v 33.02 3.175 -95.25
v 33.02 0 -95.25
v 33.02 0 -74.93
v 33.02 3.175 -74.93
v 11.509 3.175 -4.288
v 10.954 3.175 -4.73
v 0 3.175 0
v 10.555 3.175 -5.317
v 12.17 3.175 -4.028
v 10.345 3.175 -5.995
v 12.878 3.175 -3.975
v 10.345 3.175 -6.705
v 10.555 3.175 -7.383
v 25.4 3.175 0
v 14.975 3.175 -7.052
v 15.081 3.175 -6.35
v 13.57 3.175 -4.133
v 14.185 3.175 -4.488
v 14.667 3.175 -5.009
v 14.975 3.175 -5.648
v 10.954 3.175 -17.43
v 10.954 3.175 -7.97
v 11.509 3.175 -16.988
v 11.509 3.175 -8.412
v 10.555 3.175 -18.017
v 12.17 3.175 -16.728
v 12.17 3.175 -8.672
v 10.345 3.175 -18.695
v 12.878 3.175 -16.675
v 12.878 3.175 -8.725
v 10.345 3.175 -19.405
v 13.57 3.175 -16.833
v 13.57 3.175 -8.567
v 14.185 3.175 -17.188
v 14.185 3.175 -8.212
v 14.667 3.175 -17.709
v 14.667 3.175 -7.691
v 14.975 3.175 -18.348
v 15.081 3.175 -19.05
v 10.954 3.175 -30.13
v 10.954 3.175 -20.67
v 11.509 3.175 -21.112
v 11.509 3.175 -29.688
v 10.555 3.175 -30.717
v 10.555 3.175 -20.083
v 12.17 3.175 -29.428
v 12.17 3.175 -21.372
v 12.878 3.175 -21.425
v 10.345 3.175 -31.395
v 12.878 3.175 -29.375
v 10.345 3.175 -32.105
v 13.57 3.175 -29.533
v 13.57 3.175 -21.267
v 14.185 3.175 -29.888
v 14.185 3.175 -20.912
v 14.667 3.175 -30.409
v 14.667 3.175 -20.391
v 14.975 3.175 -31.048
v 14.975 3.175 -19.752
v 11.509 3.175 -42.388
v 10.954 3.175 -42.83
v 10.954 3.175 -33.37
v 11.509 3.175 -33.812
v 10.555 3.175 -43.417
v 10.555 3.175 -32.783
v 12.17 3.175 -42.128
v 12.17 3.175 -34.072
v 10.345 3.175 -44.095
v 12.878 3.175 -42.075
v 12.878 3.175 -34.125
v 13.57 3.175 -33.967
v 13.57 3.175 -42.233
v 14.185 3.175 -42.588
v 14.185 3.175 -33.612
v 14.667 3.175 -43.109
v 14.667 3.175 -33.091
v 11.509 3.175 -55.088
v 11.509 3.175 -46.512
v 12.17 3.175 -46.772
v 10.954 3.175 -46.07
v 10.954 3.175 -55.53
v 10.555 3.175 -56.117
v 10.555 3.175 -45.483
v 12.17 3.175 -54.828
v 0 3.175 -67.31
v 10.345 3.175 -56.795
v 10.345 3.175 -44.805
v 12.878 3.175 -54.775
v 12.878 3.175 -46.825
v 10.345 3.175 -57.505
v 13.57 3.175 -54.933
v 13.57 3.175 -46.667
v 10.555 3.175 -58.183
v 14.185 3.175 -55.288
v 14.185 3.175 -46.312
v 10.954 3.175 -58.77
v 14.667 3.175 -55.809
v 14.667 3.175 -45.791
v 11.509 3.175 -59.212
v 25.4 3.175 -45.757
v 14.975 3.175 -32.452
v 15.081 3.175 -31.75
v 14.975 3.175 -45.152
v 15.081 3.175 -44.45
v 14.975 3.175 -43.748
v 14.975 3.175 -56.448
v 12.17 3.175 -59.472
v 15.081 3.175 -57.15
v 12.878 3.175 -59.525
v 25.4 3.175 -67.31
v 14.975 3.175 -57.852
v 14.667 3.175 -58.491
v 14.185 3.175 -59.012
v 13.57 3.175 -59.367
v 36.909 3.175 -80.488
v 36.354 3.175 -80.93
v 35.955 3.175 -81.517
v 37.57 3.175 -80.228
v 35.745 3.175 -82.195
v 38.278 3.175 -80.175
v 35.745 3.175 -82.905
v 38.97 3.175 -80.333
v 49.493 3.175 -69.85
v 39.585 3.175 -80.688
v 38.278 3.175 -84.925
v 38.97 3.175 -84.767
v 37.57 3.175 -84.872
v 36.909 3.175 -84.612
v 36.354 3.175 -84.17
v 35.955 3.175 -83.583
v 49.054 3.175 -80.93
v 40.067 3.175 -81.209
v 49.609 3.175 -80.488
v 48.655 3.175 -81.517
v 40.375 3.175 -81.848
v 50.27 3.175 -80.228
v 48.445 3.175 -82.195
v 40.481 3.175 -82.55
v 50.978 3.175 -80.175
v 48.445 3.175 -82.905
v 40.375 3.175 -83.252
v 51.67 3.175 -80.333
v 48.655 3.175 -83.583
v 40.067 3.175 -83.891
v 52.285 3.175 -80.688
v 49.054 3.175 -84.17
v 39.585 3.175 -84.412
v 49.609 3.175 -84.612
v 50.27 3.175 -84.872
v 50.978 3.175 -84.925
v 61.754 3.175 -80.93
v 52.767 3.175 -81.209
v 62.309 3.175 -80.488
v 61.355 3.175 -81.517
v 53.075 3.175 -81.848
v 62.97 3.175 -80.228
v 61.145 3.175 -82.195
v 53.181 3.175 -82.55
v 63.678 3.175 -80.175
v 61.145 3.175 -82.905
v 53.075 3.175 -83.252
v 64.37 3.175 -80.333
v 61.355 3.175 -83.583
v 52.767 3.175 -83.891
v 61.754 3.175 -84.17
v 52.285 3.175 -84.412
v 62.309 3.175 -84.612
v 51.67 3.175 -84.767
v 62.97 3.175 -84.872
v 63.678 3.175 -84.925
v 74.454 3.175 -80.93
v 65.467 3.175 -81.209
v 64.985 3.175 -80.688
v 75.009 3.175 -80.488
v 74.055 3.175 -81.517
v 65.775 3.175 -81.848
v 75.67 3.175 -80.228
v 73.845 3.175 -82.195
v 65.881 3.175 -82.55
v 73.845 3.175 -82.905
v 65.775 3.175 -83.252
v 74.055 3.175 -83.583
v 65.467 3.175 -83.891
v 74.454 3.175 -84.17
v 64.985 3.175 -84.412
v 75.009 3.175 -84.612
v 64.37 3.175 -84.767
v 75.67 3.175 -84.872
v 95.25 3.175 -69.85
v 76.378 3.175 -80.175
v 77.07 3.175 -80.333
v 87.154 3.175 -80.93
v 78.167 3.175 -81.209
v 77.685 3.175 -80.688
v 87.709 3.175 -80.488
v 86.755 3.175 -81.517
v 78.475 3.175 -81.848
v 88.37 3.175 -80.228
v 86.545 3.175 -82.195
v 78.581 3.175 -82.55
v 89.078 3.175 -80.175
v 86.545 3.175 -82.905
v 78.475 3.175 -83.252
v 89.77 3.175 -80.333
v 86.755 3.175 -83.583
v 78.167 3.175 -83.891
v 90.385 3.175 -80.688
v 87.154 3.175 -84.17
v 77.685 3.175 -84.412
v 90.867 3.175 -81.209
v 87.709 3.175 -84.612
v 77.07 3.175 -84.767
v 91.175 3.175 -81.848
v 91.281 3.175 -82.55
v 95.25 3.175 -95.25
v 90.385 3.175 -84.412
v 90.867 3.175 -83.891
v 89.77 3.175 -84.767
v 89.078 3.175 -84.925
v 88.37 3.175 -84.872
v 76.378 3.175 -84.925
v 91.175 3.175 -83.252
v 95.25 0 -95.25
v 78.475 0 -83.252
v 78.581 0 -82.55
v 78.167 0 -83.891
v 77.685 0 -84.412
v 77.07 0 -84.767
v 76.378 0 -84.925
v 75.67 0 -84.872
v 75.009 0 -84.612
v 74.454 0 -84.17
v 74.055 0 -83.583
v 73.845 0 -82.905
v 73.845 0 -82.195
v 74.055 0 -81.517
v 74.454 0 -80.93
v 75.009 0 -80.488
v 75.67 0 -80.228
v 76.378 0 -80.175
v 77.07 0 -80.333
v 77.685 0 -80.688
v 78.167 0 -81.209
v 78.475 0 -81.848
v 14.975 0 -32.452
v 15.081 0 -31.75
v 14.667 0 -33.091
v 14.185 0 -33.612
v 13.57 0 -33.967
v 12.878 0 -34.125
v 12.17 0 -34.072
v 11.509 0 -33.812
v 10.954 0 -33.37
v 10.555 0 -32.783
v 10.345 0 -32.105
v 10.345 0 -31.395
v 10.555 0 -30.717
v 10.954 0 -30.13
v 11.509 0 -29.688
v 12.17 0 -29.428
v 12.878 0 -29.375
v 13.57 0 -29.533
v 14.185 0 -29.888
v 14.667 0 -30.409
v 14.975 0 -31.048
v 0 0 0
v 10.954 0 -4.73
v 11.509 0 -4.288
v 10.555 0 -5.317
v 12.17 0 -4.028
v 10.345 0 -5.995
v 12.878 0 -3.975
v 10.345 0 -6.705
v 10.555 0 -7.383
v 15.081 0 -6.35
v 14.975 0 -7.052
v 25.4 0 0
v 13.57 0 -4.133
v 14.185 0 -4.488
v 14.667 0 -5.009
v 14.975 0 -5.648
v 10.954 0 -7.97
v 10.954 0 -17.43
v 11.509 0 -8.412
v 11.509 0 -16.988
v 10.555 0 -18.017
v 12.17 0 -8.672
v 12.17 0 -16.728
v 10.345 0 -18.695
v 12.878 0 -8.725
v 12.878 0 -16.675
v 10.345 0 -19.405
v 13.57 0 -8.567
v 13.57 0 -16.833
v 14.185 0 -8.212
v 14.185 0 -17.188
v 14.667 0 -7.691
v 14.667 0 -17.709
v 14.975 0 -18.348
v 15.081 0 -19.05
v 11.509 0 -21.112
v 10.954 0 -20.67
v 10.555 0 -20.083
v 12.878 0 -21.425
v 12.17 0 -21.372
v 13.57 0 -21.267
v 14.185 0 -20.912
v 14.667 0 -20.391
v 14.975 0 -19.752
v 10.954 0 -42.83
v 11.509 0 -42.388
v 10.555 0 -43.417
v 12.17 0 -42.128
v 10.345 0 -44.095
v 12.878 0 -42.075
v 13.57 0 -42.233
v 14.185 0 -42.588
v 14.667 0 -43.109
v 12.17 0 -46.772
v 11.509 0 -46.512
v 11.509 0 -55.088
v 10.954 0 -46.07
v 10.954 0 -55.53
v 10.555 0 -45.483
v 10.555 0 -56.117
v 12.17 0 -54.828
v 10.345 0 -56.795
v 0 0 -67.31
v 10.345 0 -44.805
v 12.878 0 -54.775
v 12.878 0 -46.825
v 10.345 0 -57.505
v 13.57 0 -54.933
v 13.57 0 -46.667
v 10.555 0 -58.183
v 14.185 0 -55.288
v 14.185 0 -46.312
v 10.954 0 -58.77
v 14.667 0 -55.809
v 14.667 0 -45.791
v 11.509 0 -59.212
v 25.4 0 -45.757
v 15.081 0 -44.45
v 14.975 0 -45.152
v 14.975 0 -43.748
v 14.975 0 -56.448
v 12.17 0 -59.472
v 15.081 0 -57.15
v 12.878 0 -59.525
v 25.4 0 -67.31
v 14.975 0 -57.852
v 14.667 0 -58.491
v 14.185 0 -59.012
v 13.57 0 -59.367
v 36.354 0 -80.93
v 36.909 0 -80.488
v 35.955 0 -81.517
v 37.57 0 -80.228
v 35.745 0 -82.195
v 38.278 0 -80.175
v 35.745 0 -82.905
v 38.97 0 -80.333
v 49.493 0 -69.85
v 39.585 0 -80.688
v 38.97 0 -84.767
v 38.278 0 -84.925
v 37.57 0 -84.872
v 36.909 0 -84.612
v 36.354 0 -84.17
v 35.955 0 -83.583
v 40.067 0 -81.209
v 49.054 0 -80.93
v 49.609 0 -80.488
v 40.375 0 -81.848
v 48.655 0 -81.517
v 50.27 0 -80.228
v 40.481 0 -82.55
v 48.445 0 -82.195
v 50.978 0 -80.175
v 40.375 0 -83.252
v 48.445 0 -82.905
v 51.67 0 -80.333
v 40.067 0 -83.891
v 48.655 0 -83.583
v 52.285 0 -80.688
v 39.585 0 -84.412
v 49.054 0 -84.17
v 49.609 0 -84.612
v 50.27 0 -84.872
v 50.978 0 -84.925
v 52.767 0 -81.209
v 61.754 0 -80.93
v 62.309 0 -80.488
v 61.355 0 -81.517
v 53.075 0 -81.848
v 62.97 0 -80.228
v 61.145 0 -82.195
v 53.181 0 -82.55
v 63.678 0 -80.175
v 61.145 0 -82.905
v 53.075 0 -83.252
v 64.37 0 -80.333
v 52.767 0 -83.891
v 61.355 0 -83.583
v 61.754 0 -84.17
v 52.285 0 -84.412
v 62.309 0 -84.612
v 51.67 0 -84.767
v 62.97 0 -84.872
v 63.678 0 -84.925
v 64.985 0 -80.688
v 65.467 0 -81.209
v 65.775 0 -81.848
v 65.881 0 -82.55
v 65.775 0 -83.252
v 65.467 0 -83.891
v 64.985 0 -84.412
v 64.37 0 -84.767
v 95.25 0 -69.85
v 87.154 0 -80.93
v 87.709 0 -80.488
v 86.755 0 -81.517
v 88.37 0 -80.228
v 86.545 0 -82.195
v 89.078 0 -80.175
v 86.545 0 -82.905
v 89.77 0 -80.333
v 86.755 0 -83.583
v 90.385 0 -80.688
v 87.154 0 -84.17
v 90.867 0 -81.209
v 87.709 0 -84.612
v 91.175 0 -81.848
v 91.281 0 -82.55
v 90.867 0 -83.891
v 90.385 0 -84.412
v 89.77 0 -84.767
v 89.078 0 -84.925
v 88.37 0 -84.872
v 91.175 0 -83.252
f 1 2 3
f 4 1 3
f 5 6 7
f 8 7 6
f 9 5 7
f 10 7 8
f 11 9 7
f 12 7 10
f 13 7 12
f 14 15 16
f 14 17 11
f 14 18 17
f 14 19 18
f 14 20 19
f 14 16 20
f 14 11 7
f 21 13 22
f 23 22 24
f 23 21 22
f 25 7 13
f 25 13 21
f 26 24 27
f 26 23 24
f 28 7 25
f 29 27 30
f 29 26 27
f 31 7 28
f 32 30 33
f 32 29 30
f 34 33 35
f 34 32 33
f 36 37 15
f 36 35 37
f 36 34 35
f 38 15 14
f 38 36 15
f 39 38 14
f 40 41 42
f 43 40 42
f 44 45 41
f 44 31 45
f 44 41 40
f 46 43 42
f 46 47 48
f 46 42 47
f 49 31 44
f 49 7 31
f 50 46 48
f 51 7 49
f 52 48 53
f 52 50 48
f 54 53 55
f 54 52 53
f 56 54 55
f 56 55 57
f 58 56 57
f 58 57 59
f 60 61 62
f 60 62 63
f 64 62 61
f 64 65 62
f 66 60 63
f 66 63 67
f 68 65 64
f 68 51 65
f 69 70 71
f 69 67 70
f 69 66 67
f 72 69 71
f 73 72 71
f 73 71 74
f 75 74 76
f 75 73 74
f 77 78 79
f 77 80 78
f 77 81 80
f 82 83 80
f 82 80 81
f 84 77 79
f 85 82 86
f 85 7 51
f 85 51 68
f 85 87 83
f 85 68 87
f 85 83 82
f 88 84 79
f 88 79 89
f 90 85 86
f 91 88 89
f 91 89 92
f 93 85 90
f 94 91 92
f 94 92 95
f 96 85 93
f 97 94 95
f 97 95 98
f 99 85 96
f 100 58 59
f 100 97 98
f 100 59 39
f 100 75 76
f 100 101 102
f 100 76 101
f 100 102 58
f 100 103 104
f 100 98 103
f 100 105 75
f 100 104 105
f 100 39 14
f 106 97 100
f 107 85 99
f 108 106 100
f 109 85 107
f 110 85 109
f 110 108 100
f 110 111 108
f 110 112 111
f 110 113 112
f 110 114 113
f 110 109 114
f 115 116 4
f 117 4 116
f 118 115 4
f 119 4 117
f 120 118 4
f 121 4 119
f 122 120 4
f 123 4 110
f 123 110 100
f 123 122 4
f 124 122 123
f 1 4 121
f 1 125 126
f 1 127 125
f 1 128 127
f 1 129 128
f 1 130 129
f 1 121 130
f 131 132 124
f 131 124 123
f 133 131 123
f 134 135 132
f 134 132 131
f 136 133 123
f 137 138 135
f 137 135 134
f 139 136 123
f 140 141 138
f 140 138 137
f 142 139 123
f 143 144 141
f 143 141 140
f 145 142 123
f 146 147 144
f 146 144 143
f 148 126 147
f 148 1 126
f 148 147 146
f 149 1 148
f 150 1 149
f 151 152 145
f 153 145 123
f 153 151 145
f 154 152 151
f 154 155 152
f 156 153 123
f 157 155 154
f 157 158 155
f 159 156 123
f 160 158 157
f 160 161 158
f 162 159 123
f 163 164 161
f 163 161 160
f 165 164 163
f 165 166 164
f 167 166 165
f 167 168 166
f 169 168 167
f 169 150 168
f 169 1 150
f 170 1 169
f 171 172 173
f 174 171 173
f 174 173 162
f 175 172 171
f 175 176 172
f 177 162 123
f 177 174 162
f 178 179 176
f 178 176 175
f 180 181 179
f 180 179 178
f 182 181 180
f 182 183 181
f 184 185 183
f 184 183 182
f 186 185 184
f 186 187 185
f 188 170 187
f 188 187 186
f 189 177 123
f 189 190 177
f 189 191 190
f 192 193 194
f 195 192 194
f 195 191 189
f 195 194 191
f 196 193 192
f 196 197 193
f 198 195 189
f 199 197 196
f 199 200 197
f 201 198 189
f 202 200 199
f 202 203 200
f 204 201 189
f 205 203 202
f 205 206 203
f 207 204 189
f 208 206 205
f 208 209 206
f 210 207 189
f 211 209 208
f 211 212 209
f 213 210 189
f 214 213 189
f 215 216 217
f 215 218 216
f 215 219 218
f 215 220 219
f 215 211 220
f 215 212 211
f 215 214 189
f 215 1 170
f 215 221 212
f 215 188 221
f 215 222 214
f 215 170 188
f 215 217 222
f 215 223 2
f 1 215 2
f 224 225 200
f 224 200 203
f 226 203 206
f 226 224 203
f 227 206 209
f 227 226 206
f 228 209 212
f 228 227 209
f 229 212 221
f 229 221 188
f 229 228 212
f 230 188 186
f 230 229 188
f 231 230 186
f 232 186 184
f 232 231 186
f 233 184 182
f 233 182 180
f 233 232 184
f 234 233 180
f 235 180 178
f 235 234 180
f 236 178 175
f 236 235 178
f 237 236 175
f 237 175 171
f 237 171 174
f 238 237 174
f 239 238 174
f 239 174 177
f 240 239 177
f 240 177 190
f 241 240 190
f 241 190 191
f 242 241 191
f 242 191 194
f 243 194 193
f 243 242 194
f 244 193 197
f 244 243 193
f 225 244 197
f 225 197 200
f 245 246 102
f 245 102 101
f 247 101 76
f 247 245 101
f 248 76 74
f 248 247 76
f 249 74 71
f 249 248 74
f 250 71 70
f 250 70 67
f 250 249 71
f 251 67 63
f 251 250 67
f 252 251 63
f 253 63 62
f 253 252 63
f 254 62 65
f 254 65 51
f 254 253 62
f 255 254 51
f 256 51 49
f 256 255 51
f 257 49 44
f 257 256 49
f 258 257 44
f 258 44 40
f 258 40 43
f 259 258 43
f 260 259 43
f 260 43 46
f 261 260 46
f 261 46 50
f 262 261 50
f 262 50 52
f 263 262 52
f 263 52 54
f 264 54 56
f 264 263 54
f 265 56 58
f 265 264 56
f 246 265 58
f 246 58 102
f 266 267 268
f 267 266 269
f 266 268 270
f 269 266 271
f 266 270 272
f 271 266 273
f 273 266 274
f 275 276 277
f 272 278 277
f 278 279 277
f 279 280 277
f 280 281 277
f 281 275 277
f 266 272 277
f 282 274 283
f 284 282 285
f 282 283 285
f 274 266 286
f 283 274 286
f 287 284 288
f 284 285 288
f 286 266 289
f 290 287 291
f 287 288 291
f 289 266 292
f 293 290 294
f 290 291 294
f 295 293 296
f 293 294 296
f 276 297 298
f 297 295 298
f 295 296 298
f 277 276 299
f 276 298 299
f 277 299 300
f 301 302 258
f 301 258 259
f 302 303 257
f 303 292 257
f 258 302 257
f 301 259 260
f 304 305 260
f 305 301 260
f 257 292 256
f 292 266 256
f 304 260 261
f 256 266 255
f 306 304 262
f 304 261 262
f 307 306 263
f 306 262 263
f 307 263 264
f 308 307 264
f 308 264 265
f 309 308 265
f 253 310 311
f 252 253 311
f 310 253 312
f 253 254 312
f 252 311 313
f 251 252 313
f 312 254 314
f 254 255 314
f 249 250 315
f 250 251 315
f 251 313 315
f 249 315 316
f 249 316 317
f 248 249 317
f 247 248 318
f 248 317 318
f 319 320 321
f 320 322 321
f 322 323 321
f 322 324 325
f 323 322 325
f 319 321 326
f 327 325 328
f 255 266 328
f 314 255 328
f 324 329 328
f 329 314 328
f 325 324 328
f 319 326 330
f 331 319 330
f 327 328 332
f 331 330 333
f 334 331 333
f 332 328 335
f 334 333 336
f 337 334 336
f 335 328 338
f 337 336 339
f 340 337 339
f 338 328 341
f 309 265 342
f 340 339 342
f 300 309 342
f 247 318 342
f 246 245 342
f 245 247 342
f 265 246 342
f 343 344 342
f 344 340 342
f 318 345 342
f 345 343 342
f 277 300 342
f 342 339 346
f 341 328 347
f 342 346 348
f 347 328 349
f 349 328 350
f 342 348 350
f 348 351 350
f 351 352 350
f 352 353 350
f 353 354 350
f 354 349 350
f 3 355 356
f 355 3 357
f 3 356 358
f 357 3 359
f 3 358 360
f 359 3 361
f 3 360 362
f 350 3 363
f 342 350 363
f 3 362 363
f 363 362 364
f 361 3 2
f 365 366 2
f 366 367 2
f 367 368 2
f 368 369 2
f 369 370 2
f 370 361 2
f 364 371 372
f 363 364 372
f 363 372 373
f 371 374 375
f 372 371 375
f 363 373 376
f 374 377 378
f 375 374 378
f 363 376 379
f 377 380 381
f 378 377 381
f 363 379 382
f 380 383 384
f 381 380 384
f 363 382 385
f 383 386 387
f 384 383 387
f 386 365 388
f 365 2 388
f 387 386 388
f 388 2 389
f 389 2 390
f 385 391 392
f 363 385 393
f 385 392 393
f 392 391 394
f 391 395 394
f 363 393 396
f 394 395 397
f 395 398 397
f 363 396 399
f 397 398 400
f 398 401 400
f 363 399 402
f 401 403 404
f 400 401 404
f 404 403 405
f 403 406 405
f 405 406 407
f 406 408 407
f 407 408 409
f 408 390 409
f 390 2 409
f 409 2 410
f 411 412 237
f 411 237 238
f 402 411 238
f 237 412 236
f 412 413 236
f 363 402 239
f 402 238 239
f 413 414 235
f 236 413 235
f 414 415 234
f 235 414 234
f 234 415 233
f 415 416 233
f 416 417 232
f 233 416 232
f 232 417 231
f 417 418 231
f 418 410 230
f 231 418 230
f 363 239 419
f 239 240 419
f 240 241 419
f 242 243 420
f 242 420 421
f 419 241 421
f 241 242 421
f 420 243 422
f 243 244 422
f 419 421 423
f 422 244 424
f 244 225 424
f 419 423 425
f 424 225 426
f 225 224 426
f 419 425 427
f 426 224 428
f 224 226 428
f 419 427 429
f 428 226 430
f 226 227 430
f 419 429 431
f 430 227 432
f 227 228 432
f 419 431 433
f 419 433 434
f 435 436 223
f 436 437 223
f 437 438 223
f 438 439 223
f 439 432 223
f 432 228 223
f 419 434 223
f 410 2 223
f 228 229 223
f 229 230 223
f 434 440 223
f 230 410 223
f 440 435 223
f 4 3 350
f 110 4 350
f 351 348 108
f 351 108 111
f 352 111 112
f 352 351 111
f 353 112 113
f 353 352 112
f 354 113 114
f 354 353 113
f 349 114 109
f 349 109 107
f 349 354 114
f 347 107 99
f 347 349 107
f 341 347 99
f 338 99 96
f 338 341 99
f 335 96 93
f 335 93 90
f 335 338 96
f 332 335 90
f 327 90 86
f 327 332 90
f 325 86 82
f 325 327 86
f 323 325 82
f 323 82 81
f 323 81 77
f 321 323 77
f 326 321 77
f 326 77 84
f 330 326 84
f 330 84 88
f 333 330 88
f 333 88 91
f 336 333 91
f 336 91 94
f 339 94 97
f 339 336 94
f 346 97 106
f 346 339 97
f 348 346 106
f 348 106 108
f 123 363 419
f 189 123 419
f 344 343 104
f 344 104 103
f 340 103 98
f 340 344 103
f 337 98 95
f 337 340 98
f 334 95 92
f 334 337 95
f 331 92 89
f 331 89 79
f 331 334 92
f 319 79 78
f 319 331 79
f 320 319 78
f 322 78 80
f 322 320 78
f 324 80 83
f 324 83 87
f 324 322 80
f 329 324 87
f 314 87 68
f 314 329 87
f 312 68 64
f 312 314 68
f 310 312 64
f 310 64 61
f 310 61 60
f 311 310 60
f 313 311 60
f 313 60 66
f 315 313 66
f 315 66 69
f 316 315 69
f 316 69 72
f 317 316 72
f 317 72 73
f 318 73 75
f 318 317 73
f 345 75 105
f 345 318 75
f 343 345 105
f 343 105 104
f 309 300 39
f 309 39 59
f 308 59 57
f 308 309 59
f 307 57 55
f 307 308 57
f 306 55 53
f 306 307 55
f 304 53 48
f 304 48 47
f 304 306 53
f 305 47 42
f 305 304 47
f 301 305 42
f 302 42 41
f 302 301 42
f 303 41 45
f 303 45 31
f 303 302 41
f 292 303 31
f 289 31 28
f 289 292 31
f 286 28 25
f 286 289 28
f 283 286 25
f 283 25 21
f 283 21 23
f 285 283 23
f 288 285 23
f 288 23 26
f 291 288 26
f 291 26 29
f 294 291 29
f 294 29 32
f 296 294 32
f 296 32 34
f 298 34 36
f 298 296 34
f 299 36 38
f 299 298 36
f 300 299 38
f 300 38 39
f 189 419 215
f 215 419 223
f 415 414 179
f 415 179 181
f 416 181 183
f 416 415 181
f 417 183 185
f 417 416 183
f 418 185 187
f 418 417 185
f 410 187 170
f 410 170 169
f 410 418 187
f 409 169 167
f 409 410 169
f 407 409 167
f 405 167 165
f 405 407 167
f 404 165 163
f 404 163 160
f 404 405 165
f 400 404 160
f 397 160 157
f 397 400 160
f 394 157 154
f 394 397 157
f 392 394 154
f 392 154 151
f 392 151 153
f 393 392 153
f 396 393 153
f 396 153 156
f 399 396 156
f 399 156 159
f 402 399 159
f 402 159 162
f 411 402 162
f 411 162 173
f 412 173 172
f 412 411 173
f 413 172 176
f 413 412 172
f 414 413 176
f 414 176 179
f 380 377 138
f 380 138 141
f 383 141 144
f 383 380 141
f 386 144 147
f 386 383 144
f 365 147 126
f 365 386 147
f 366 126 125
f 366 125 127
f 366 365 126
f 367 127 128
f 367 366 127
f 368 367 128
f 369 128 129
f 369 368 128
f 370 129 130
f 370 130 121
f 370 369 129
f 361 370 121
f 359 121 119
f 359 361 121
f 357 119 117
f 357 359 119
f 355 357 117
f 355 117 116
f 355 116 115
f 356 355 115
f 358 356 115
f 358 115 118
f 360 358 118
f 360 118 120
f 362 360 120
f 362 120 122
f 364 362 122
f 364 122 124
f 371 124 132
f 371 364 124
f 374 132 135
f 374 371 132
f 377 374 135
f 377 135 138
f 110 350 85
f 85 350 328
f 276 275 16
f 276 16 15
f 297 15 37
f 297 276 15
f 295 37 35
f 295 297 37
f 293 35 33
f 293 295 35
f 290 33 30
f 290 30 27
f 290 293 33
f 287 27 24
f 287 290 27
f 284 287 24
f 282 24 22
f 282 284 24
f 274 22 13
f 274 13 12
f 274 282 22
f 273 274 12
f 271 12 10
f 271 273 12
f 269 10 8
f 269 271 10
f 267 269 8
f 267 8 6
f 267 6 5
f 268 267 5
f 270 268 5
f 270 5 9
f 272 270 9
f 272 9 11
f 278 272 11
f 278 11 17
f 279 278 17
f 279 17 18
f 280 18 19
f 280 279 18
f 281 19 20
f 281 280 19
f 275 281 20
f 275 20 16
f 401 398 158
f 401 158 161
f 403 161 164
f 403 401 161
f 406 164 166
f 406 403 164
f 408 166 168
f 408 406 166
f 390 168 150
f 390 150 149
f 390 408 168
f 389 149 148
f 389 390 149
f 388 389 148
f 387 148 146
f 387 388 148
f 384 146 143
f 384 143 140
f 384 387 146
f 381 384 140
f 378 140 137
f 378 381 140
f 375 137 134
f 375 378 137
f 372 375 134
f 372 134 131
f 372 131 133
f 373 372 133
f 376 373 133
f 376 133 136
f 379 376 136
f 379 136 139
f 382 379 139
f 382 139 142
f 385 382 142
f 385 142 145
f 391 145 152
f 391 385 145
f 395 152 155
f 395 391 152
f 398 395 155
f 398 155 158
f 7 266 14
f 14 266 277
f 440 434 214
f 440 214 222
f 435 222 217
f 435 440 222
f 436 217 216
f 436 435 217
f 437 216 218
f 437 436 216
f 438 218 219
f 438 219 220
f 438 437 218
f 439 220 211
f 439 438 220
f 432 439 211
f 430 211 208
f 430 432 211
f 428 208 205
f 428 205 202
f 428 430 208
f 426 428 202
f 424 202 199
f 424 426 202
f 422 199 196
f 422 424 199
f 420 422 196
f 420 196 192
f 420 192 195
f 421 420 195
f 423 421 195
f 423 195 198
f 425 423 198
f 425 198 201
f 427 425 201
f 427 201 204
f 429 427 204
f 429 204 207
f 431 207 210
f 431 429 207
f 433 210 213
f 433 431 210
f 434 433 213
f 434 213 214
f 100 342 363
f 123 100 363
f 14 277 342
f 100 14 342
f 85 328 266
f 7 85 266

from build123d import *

# Parameters (mm, degrees)
SKETCH1_R           = 2.38125
BOSS_EXTRUDE1_DEPTH = 3.175


with BuildPart() as part:
    # Sketch1 → Boss-Extrude1 (new body)
    with BuildSketch(Plane(origin=(0, 0, 0), x_dir=(1, 0, 0), z_dir=(0, 1, 0))):
        Polygon((0, 67.31), (0, 0), (25.4, 0), (25.4, 45.757385309), (49.492614691, 69.85), (95.25, 69.85), (95.25, 95.25), (33.02, 95.25), (33.02, 74.93), (25.4, 67.31), align=None)
        with Locations((12.7, 19.05)):
            Circle(SKETCH1_R, mode=Mode.SUBTRACT)
        with Locations((12.7, 31.75)):
            Circle(SKETCH1_R, mode=Mode.SUBTRACT)
        with Locations((12.7, 44.45)):
            Circle(SKETCH1_R, mode=Mode.SUBTRACT)
        with Locations((12.7, 57.15)):
            Circle(SKETCH1_R, mode=Mode.SUBTRACT)
        with Locations((38.1, 82.55)):
            Circle(SKETCH1_R, mode=Mode.SUBTRACT)
        with Locations((50.8, 82.55)):
            Circle(SKETCH1_R, mode=Mode.SUBTRACT)
        with Locations((63.5, 82.55)):
            Circle(SKETCH1_R, mode=Mode.SUBTRACT)
        with Locations((76.2, 82.55)):
            Circle(SKETCH1_R, mode=Mode.SUBTRACT)
        with Locations((88.9, 82.55)):
            Circle(SKETCH1_R, mode=Mode.SUBTRACT)
        with Locations((12.7, 6.35)):
            Circle(SKETCH1_R, mode=Mode.SUBTRACT)
    extrude(amount=BOSS_EXTRUDE1_DEPTH)


solid = part.part
